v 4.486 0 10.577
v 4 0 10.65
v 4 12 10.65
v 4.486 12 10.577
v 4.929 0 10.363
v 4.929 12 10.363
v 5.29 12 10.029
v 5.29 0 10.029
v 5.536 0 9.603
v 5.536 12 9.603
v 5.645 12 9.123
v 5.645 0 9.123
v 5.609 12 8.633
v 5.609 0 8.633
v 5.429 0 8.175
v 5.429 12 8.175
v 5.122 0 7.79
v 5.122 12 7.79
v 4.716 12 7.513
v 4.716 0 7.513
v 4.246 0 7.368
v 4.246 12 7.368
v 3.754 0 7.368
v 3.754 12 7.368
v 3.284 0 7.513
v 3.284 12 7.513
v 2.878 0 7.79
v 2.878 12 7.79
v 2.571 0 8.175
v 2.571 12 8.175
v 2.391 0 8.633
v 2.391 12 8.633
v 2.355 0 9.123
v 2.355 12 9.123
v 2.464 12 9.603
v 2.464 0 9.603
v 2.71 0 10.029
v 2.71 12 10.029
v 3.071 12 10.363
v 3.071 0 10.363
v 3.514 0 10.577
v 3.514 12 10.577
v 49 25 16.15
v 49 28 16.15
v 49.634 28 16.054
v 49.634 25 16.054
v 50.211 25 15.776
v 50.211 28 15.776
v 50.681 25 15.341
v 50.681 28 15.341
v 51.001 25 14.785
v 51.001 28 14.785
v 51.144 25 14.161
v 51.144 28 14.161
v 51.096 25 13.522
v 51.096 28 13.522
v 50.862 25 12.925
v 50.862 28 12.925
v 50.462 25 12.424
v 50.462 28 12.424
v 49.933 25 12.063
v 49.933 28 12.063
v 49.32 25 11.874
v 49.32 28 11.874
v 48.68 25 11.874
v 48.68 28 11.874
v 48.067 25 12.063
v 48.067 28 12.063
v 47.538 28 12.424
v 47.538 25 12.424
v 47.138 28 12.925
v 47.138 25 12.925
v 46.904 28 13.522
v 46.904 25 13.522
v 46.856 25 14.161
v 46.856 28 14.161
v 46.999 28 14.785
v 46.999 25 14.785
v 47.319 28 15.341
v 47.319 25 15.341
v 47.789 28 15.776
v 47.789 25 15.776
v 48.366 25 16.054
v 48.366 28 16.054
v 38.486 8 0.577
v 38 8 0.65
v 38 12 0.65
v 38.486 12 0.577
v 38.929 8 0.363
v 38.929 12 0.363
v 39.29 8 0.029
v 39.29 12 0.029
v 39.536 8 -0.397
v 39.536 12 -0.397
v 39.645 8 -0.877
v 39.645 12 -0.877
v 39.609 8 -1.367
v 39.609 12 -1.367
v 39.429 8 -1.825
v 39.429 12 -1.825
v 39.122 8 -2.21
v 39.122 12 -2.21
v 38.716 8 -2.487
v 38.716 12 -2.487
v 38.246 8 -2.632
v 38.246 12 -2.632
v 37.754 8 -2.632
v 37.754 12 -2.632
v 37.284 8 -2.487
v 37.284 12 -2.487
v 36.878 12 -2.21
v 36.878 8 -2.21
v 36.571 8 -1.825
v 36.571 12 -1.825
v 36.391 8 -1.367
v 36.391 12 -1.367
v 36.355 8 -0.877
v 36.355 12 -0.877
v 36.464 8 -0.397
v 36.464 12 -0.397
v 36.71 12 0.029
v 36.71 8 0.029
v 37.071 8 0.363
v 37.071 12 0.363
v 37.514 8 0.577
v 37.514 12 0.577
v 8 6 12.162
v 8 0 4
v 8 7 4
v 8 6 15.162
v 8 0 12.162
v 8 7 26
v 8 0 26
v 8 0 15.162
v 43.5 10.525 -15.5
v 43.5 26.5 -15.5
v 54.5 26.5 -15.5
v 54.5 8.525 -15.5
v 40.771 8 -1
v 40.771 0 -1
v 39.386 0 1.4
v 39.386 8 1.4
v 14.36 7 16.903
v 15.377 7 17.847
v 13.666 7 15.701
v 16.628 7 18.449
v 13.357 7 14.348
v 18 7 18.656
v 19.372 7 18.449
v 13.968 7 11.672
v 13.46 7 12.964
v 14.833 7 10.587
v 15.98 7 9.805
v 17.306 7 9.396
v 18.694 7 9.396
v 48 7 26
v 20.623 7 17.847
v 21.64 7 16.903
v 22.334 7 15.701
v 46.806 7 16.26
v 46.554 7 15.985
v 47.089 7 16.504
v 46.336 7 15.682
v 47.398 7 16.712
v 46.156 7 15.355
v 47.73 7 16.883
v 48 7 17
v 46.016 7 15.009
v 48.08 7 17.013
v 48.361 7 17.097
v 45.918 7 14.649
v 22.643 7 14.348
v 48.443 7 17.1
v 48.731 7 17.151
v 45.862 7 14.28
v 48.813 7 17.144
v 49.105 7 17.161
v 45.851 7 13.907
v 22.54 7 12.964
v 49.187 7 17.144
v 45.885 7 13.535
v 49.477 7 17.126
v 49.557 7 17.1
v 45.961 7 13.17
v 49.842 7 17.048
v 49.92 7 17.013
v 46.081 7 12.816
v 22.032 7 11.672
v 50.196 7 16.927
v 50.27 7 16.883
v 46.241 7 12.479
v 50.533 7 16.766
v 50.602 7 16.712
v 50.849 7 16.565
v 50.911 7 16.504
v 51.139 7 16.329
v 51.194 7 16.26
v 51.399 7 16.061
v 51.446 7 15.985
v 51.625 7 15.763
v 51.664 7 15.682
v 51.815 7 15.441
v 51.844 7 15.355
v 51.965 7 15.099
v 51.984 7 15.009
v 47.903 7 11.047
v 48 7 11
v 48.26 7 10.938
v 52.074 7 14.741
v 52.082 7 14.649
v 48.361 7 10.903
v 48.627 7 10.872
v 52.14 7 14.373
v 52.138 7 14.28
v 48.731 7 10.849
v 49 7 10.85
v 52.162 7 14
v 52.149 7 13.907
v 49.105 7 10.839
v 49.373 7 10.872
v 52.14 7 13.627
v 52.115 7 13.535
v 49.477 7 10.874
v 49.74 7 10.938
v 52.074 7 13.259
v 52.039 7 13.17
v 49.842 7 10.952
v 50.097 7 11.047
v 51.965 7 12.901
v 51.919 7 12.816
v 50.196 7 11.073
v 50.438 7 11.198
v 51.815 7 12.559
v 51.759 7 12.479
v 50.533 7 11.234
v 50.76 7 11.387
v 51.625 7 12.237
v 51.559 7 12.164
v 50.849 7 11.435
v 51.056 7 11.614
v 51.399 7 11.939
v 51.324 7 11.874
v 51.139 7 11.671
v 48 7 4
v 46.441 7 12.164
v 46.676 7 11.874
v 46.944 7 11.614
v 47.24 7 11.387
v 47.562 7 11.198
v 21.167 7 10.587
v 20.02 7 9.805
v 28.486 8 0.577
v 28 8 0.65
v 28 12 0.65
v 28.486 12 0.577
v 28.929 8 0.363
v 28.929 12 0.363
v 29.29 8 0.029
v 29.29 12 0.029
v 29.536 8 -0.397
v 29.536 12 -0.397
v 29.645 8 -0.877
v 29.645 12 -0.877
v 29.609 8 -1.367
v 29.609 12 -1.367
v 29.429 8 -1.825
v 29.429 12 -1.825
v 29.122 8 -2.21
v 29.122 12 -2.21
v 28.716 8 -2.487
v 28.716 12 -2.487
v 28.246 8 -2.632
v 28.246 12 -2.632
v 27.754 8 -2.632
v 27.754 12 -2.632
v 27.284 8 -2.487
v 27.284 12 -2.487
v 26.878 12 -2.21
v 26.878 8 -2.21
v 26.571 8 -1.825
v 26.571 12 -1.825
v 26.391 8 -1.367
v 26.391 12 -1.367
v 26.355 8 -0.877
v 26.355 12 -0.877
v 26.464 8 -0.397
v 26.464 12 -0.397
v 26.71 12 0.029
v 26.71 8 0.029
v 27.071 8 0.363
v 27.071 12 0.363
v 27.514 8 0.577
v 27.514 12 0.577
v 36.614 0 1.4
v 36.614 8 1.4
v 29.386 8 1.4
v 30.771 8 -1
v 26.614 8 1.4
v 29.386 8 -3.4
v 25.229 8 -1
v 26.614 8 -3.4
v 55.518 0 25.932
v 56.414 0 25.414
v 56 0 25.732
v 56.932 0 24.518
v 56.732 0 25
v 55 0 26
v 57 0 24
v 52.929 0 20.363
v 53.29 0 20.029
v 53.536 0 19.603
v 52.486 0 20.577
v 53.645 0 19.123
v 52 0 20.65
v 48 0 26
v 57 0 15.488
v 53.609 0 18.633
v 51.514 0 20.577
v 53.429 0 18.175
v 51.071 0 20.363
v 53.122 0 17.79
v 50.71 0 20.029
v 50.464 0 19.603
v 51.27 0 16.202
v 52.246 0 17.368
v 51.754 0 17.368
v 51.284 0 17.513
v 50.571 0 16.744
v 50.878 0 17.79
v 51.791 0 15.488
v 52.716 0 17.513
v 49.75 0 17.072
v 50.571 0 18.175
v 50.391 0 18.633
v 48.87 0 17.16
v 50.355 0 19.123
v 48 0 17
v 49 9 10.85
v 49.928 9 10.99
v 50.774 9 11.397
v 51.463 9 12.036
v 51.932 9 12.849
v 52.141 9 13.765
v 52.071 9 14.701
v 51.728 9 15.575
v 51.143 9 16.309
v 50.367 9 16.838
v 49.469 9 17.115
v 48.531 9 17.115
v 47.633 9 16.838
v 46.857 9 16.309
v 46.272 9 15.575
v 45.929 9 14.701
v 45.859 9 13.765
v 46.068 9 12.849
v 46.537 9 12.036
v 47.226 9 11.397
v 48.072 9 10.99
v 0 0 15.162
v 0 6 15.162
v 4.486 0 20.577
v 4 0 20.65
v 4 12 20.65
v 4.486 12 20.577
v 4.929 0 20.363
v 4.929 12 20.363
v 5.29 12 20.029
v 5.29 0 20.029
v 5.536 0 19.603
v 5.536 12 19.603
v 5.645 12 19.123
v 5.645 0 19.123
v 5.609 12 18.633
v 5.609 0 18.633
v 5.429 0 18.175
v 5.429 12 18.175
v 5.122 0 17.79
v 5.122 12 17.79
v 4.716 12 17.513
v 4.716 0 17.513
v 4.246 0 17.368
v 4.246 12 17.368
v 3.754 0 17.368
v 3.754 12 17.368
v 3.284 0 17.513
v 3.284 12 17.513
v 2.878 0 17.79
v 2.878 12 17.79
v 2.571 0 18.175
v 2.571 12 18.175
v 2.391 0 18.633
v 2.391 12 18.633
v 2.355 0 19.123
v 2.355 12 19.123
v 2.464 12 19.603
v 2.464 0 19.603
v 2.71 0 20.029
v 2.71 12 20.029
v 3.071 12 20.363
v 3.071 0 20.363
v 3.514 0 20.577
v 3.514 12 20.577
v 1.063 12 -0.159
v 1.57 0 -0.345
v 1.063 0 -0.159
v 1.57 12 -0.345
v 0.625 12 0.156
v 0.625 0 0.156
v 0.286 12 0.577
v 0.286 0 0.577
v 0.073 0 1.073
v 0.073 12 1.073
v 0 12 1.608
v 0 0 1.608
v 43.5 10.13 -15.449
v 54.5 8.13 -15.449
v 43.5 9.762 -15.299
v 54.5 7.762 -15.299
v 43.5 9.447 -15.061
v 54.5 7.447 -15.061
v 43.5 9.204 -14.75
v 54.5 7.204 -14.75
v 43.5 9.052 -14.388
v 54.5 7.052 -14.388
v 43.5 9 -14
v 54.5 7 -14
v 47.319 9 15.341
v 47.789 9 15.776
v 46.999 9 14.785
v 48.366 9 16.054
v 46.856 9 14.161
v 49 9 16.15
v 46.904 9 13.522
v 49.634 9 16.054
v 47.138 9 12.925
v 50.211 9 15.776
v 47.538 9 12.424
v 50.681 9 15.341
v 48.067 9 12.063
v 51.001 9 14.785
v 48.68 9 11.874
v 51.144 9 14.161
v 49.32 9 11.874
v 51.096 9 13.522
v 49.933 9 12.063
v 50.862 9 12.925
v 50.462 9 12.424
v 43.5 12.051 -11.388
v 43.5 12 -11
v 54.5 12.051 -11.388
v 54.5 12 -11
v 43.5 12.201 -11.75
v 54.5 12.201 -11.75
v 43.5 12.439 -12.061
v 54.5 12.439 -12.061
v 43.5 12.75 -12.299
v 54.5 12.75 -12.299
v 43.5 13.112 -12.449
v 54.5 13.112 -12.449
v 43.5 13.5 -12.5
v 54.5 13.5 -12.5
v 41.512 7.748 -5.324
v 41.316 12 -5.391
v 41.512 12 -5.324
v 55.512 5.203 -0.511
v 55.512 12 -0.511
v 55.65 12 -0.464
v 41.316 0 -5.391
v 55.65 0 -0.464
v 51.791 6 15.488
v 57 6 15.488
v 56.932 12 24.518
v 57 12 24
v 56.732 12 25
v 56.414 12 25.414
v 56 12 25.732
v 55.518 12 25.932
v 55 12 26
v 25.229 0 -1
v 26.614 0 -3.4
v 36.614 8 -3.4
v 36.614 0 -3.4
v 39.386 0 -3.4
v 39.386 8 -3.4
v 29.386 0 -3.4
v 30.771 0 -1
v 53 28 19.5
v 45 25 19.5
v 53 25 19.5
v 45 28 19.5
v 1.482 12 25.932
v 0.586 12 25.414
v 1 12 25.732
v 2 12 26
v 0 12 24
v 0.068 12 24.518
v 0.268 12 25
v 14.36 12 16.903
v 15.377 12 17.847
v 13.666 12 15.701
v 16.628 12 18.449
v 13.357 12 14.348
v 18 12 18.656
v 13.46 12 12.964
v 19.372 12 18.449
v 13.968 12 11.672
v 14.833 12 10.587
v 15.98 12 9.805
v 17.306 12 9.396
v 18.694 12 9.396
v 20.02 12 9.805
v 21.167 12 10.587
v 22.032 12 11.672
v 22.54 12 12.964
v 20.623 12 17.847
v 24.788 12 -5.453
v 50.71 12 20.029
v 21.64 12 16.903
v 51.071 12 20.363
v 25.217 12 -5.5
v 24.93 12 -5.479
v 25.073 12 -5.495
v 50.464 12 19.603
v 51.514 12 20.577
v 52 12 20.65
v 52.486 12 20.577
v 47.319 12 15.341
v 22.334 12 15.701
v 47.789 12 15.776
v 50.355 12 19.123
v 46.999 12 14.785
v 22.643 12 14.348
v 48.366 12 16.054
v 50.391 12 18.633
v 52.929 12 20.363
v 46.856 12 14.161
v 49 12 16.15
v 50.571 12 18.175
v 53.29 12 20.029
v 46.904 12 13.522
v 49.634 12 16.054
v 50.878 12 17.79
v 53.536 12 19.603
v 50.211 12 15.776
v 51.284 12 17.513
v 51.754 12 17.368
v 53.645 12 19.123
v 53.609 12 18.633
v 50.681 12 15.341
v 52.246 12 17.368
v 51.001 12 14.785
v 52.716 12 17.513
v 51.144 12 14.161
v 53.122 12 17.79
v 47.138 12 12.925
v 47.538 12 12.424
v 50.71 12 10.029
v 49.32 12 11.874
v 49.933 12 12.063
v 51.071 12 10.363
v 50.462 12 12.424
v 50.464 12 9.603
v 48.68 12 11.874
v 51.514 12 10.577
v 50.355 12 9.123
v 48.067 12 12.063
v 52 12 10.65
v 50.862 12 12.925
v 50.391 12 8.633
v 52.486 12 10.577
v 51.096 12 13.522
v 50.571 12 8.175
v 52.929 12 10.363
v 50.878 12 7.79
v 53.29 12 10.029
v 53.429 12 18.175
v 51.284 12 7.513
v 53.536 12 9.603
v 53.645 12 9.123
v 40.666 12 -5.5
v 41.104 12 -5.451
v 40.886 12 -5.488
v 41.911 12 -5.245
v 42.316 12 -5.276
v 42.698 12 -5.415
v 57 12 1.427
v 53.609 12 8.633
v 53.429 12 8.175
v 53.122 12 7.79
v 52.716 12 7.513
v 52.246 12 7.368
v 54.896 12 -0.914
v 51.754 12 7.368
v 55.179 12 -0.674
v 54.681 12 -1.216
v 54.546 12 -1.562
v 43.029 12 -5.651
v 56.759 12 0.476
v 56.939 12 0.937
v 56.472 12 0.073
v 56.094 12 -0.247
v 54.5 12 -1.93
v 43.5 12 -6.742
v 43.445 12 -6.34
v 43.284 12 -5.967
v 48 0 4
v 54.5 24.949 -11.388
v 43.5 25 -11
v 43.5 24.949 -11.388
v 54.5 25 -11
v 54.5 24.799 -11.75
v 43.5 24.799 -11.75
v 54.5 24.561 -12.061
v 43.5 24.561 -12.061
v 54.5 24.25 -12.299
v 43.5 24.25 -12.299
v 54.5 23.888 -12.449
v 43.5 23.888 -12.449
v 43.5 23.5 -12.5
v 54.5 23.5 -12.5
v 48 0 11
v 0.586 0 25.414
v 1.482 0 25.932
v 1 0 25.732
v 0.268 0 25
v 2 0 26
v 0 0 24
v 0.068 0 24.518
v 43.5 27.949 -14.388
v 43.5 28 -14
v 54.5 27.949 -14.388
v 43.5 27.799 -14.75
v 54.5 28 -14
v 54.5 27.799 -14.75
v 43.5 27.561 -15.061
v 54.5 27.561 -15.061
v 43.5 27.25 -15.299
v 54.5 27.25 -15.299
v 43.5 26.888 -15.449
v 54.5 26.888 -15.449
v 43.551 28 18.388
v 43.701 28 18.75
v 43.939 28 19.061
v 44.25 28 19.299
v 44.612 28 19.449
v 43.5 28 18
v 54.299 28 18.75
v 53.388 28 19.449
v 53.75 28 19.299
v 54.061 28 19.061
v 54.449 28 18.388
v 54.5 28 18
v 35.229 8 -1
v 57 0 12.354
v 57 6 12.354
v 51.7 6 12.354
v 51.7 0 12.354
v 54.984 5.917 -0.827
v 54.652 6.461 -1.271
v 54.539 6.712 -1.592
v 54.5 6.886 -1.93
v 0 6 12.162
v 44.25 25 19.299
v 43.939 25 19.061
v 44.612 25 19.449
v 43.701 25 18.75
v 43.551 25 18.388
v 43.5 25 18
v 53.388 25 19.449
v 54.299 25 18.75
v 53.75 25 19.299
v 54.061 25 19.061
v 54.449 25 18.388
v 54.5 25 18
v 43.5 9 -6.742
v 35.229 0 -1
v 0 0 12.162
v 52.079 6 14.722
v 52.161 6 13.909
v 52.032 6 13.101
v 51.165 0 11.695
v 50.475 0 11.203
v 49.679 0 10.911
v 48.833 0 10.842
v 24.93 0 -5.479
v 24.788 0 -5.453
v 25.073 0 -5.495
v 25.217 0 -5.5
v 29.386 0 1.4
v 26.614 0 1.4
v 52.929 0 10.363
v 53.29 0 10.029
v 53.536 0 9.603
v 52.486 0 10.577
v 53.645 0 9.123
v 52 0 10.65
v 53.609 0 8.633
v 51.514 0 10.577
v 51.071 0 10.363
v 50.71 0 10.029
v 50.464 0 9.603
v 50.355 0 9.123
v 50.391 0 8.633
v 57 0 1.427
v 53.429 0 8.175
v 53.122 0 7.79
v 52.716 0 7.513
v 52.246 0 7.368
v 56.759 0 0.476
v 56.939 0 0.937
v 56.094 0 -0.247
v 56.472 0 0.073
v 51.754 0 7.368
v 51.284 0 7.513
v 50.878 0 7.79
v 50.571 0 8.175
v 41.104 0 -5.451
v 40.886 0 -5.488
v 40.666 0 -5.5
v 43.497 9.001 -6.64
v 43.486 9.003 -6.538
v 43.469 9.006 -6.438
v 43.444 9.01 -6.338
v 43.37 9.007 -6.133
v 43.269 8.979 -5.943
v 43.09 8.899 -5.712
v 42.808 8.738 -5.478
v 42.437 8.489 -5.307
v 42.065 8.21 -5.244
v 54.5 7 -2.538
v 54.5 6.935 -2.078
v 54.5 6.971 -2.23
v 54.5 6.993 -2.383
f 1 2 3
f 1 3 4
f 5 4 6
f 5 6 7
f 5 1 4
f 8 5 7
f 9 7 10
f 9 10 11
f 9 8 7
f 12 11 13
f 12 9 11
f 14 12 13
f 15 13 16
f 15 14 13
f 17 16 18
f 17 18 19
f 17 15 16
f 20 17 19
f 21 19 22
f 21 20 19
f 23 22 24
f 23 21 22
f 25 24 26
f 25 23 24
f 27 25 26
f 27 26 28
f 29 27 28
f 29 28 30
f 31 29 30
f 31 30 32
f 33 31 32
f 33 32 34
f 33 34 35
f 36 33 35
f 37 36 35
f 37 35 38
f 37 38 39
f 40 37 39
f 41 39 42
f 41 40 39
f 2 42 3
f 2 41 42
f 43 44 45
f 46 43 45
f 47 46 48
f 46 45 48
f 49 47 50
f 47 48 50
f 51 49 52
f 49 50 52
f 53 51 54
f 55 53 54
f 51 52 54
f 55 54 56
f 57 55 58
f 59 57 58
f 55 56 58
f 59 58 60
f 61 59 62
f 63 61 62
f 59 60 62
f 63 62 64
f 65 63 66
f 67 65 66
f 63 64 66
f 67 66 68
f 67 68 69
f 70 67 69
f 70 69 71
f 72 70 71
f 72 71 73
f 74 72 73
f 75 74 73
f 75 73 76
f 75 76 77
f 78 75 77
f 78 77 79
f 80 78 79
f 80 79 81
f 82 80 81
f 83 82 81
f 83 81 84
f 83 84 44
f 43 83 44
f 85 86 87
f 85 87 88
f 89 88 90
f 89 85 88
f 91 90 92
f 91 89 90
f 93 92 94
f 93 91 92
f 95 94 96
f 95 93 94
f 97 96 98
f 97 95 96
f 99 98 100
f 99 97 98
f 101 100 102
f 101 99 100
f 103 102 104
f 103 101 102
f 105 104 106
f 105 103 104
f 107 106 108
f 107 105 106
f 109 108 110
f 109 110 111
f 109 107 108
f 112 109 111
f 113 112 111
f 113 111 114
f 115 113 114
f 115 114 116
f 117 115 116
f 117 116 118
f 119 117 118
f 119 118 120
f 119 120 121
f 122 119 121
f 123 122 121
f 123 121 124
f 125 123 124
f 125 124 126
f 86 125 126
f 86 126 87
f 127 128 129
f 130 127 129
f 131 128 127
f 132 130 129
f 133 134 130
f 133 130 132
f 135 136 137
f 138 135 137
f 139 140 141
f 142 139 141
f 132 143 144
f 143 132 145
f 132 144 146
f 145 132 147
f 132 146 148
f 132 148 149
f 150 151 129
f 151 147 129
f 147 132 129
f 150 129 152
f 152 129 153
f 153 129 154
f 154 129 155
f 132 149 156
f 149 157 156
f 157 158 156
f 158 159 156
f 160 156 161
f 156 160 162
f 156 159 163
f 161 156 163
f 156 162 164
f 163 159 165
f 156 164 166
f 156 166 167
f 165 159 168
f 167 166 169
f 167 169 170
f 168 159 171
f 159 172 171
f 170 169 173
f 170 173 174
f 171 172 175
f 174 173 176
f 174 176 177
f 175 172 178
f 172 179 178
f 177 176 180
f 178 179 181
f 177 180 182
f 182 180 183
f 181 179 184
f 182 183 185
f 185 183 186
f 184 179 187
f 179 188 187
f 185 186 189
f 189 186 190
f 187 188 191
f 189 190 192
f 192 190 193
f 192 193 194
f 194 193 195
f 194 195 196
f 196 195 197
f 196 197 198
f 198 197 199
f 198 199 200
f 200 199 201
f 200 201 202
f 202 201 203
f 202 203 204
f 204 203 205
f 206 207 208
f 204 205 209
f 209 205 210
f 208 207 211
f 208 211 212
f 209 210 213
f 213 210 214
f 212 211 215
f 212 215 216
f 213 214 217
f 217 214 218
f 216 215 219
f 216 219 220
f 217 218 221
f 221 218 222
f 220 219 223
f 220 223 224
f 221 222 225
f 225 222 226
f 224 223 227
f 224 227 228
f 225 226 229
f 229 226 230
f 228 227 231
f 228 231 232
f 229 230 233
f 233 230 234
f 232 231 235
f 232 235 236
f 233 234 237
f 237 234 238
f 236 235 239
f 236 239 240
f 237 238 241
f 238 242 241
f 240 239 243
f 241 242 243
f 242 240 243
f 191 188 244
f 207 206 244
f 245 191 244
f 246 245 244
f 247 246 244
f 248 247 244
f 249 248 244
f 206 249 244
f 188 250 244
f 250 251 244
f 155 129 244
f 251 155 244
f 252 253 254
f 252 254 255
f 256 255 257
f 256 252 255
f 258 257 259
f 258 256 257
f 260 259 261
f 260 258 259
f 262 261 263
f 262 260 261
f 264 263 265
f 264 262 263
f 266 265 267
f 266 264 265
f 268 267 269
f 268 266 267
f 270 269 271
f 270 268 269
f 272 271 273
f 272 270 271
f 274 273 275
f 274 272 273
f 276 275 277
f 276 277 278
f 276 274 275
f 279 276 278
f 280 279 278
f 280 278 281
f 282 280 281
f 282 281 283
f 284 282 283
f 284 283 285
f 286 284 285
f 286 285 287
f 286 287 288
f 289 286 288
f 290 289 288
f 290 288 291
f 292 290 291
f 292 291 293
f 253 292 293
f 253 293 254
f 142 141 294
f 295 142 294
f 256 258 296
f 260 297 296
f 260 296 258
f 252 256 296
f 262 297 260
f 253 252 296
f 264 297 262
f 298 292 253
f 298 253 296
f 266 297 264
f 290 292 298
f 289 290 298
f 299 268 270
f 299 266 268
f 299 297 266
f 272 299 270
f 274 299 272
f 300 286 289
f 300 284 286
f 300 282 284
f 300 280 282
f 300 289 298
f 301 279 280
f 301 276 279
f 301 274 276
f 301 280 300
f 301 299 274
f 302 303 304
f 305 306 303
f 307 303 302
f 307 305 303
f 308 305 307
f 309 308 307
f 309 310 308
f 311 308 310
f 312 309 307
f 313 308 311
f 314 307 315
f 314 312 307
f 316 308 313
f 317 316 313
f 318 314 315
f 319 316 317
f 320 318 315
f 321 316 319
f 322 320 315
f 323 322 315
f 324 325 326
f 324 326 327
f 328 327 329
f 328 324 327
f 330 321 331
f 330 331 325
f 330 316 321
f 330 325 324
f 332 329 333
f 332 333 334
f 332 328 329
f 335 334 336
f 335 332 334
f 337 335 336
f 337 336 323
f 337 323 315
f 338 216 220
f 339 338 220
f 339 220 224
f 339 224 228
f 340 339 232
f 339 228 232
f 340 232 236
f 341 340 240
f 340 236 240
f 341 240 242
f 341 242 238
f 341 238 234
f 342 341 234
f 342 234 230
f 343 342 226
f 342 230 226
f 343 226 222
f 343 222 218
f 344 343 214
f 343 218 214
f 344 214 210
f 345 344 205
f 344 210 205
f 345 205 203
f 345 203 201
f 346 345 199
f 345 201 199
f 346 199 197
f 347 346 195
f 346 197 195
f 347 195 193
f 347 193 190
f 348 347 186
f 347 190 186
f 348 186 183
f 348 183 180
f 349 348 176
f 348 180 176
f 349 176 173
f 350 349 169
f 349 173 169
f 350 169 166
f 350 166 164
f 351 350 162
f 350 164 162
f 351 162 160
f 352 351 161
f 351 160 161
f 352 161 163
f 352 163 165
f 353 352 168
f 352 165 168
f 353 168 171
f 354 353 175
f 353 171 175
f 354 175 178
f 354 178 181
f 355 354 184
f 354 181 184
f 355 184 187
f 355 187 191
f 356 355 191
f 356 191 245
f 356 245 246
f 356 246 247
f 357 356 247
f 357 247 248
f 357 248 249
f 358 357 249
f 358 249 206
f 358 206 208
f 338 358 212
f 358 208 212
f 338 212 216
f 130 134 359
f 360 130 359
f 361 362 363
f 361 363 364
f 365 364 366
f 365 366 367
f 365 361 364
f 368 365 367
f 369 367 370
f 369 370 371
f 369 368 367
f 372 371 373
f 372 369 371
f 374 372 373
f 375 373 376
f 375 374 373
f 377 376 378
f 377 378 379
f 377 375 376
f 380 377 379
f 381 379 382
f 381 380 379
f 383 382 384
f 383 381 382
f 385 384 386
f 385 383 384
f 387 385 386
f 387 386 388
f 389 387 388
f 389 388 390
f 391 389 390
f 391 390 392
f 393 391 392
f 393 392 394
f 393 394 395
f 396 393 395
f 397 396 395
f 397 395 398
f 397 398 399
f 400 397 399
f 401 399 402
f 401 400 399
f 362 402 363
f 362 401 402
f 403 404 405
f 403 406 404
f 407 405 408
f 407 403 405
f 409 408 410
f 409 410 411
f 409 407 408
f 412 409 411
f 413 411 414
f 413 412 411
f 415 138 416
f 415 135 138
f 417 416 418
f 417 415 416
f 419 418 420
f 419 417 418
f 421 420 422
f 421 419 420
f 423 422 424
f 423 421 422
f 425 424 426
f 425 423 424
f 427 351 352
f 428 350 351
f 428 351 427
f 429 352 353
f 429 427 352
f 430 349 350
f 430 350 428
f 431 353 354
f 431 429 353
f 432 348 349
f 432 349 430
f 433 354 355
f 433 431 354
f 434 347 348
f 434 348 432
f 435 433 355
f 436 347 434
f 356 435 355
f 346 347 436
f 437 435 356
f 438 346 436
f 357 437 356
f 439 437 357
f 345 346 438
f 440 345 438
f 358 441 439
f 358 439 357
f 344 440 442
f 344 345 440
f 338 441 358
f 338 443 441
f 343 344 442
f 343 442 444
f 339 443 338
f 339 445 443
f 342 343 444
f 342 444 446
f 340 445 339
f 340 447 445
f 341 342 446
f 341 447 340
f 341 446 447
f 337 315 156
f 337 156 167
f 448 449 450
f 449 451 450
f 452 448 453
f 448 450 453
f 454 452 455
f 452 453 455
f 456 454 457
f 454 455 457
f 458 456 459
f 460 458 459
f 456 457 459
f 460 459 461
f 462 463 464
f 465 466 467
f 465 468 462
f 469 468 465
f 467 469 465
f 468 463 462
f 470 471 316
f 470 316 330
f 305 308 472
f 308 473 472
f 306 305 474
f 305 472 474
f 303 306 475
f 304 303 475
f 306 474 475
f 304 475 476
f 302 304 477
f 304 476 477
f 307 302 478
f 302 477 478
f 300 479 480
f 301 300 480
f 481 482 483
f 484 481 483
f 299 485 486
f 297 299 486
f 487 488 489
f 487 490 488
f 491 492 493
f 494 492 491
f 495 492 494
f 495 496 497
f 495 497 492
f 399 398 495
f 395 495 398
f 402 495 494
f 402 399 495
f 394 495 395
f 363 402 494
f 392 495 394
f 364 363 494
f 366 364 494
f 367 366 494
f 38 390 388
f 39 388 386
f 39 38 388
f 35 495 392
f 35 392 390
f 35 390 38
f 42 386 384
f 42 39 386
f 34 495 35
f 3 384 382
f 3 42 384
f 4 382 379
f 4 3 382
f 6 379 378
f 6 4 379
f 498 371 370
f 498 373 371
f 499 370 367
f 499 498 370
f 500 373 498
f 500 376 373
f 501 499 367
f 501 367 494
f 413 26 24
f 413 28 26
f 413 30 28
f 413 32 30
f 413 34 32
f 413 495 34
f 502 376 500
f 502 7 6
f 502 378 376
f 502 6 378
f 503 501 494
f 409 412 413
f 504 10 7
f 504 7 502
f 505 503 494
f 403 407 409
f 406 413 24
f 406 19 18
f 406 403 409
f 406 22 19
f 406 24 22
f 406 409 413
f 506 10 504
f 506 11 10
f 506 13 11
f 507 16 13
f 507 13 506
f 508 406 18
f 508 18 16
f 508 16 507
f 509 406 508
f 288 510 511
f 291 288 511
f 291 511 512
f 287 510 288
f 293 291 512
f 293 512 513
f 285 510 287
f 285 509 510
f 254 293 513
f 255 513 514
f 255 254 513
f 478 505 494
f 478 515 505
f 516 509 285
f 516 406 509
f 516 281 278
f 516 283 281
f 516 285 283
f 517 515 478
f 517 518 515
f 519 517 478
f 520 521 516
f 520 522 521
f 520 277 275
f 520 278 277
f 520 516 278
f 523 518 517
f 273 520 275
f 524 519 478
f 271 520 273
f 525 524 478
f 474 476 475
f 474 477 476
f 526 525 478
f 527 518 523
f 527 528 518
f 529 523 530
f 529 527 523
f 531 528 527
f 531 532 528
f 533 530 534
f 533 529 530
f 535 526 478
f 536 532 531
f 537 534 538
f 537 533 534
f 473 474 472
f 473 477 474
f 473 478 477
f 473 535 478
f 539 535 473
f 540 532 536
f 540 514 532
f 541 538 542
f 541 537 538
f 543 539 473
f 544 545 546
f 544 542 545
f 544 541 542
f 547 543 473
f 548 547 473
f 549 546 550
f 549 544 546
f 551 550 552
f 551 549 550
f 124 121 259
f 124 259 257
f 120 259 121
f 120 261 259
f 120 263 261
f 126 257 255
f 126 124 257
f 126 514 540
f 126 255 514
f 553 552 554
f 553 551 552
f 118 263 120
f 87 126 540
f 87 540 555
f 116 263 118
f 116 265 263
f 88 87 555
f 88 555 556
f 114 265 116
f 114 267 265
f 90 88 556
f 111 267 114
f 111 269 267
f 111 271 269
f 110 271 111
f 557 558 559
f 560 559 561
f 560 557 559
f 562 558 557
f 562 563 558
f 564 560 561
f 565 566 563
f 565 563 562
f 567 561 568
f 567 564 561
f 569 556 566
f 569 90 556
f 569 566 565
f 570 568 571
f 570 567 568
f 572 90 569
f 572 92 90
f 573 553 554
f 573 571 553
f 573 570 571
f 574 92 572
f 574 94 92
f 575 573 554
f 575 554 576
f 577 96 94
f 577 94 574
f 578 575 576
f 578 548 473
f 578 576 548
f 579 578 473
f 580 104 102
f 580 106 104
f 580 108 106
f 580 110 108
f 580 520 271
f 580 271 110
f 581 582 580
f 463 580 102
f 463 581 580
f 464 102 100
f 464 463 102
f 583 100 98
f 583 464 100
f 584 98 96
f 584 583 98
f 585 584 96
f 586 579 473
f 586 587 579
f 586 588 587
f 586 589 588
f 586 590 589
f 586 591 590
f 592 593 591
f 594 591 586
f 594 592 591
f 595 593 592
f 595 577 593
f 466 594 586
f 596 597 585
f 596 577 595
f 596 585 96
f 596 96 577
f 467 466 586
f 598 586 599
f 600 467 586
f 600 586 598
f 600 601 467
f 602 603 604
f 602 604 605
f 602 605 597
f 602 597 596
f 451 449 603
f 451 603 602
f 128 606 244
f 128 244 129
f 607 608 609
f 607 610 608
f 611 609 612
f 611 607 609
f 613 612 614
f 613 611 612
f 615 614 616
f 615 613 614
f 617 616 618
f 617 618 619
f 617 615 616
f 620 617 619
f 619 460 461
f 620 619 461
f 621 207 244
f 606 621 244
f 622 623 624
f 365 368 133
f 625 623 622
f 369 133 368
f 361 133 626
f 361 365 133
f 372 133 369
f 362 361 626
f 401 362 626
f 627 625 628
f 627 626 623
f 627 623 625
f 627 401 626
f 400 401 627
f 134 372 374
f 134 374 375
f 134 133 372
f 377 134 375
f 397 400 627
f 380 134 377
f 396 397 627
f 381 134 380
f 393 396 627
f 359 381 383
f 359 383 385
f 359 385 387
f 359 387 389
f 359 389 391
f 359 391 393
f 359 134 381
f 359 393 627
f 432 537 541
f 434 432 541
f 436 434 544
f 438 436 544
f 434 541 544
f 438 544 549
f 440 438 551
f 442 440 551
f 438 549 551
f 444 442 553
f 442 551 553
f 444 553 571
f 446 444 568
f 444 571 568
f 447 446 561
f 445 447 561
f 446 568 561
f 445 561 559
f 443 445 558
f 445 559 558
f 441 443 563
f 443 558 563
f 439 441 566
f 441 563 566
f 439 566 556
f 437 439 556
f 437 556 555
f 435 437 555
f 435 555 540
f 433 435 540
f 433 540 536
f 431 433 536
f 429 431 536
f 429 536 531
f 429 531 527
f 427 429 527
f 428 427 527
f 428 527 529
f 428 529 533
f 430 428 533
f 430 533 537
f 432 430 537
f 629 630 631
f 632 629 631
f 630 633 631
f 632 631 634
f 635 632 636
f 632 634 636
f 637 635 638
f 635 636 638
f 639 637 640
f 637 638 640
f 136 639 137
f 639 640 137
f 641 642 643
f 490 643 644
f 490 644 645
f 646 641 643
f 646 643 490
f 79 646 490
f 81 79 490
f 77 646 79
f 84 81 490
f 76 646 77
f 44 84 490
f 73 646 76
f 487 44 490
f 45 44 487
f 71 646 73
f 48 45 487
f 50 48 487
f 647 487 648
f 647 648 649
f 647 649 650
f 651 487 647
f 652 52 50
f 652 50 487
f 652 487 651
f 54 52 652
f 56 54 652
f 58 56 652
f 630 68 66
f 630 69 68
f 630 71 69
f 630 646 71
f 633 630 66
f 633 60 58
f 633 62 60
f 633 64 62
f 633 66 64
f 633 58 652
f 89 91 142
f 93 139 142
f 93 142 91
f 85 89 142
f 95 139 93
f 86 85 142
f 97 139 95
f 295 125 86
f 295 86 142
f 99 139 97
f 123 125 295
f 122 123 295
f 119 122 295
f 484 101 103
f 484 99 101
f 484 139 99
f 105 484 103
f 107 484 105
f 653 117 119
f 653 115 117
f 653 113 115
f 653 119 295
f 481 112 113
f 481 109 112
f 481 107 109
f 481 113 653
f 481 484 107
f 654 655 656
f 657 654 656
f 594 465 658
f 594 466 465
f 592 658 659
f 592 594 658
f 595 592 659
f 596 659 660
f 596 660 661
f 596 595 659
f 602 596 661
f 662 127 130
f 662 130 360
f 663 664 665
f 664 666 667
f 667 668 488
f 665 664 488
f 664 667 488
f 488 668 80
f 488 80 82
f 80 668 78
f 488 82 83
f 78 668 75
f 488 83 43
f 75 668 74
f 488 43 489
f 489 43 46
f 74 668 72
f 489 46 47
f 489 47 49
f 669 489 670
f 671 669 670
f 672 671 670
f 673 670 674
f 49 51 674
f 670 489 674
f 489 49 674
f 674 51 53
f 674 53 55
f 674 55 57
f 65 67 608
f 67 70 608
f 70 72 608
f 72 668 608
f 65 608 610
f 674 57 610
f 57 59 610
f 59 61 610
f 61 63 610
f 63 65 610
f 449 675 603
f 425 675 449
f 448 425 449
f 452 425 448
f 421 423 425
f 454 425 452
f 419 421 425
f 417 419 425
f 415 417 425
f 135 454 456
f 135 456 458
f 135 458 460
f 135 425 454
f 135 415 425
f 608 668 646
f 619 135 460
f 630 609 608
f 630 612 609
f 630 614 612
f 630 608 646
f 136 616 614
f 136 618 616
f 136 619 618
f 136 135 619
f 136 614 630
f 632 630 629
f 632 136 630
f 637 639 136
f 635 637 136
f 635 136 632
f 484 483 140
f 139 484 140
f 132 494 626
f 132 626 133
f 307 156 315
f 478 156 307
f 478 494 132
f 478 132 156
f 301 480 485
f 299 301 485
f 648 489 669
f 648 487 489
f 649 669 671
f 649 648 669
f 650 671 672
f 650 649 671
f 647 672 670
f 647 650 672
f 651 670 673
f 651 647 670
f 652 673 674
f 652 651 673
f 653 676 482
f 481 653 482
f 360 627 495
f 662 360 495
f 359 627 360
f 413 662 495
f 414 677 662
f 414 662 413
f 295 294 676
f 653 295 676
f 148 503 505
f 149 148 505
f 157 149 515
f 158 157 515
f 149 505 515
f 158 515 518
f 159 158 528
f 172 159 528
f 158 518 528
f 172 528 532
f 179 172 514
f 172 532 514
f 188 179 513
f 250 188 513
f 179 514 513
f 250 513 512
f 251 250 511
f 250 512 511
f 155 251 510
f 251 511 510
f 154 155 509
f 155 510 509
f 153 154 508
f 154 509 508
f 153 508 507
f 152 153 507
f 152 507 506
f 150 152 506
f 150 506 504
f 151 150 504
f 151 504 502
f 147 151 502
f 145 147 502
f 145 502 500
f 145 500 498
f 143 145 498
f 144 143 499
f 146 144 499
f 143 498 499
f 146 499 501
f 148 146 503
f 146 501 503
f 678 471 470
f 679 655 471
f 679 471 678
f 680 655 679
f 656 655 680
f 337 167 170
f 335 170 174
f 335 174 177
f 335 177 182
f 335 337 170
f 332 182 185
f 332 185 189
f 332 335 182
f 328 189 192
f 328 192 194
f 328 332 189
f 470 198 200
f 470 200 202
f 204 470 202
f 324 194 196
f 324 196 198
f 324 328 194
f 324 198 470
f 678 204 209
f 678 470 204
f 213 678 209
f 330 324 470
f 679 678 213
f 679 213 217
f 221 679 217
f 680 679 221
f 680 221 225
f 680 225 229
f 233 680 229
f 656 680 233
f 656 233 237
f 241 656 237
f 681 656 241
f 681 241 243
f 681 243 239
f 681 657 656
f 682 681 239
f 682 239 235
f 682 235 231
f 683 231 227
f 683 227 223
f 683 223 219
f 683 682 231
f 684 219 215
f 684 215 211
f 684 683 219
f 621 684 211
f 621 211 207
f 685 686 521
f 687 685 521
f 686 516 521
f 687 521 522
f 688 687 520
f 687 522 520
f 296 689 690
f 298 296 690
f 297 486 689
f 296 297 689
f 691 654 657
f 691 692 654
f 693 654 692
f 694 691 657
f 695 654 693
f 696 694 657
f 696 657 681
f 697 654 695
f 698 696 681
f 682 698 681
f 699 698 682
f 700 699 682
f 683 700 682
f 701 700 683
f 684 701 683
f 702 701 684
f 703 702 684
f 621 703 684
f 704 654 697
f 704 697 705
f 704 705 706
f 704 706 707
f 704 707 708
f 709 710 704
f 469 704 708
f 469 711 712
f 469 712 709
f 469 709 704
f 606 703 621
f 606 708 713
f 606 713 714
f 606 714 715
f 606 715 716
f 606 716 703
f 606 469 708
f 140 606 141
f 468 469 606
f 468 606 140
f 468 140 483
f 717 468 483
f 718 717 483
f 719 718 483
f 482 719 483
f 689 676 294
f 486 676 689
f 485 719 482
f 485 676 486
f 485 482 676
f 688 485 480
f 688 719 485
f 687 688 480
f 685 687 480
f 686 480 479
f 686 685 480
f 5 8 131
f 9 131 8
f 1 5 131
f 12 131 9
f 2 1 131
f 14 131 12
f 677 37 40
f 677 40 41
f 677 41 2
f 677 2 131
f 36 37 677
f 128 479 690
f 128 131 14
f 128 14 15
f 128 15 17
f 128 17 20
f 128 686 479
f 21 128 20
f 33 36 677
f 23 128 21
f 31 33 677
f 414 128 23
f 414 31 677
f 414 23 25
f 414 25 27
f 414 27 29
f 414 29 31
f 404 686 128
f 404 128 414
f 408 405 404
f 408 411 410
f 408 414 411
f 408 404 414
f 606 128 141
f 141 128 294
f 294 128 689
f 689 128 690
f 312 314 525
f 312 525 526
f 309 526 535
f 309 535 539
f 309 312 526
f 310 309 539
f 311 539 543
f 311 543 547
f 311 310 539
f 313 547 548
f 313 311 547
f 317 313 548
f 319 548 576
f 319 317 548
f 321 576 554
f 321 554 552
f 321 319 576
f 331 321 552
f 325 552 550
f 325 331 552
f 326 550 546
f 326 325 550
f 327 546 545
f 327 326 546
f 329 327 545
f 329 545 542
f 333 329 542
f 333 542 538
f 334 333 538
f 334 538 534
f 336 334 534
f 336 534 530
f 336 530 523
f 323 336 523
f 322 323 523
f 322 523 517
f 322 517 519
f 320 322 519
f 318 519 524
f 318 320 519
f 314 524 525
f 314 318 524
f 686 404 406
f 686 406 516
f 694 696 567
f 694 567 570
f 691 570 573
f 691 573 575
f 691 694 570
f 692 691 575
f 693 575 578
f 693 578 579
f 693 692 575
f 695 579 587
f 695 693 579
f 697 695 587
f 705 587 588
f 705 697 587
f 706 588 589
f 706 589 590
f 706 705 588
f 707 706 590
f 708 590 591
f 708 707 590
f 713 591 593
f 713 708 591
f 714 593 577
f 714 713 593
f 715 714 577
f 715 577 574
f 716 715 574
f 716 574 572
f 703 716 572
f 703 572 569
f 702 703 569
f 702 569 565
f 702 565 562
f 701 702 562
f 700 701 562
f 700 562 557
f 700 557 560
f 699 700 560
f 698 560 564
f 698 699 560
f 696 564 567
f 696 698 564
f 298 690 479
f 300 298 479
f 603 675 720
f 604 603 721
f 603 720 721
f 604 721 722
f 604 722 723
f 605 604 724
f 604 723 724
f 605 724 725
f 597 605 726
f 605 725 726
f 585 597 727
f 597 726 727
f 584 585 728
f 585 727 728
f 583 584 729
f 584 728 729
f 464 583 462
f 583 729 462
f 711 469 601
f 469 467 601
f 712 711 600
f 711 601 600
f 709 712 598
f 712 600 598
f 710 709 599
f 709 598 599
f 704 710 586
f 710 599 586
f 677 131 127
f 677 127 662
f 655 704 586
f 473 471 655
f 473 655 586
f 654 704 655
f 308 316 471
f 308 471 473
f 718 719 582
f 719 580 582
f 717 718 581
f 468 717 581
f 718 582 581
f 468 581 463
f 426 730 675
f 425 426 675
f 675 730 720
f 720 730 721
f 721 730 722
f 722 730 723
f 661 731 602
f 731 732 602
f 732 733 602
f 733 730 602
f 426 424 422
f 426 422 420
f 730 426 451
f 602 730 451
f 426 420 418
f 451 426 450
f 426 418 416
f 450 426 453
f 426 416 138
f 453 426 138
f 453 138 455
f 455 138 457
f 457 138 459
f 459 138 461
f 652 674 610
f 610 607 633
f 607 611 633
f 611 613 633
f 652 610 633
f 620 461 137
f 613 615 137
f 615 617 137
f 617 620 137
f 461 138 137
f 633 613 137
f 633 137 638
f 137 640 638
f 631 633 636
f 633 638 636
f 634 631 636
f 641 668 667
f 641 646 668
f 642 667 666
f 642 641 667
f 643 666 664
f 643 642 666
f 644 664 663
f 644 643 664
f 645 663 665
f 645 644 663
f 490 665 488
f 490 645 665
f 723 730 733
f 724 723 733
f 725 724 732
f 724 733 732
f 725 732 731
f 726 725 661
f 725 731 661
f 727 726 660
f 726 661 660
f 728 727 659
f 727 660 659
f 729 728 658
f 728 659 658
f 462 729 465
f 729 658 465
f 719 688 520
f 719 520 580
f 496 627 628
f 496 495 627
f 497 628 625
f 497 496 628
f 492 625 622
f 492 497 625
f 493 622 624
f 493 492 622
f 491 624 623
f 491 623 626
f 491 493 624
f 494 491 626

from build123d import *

# Parameters (mm, degrees)
SKETCH_1_R           = 1.6500000000000006
SKETCH_1_R_2         = 1.6500000000000001
SKETCH_1_R_3         = 1.6500000000000028
SKETCH_1_R_4         = 1.6500000000000017
SKETCH_1_R_5         = 1.6499999999999986
SKETCH_1_R_6         = 1.6499999999999955
EXTRUDE_1_DEPTH      = 12
CUT_EXTRUDE_1_DEPTH  = 8
FILLET_1_R           = 2
SKETCH_5_R           = 1.5499999999999978
EXTRUDE_3_DEPTH      = 5
SKETCH_5_R_2         = 1.5500000000000012
EXTRUDE_3_2_DEPTH    = 5
SKETCH_5_R_3         = 4.656253475136203
EXTRUDE_3_3_DEPTH    = 5
SKETCH_7_R           = 3.149999999999999
CUT_EXTRUDE_2_DEPTH  = 2
SKETCH_8_W           = 8
SKETCH_8_H           = 3
SKETCH_8_W_2         = 5.29999999999999
SKETCH_8_H_2         = 3.1337502138362687
CUT_EXTRUDE_3_DEPTH  = 6
SKETCH_6_R           = 1.5499999999999974
SKETCH_6_R_2         = 1.5500000000000012
CUT_EXTRUDE_4_DEPTH  = 10
EXTRUDE_9_DEPTH      = 10
EXTRUDE_9_DEPTH_BACK = 10
SKETCH_18_W          = 11.000000000000007
SKETCH_18_H          = 3
EXTRUDE_10_DEPTH     = 16
SKETCH_19_W          = 11.000000000000007
SKETCH_19_H          = 3
EXTRUDE_11_DEPTH     = 32
SKETCH_20_R          = 2.1500000000000012
CUT_EXTRUDE_7_DEPTH  = 22
FILLET_4_R           = 1.5


with BuildPart() as part:
    # 草图1 → 凸台-拉伸1 (new body)
    with BuildSketch(Plane(origin=(0, 0, 0), x_dir=(1, 0, 0), z_dir=(0, 1, 0))):
        with BuildLine():
            Line((0, 0), (25, 5.5))
            Line((25, 5.5), (41, 5.5))
            Line((41, 5.5), (57, 0))
            Line((57, 0), (57, -26.000000000000004))
            Line((57, -26.000000000000004), (48, -26.000000000000004))
            Line((48, -26.000000000000004), (48, -17.000000000000004))
            ThreePointArc((48, -17.000000000000004), (52.16227766016838, -14.000000000000004), (48, -11.000000000000004))
            Line((48, -11.000000000000004), (48, -4.0000000000000036))
            Line((48, -4.0000000000000036), (8.000000000000004, -4.0000000000000036))
            Line((8.000000000000004, -4.0000000000000036), (8.000000000000004, -26.000000000000004))
            Line((8.000000000000004, -26.000000000000004), (0, -26.000000000000004))
            Line((0, -26.000000000000004), (0, 0))
        make_face()
        with Locations(Location((4.000000000000001, -9.000000000000002, 0), (0, 0, 270))):
            Circle(SKETCH_1_R, mode=Mode.SUBTRACT)
        with Locations(Location((4.000000000000001, -19.000000000000004, 0), (0, 0, 270))):
            Circle(SKETCH_1_R_2, mode=Mode.SUBTRACT)
        with Locations(Location((52.00000000000001, -9.000000000000002, 0), (0, 0, 270))):
            Circle(SKETCH_1_R_3, mode=Mode.SUBTRACT)
        with Locations(Location((52.00000000000001, -19.000000000000004, 0), (0, 0, 270))):
            Circle(SKETCH_1_R_4, mode=Mode.SUBTRACT)
        with Locations(Location((28, 0.9999999999999966, 0), (0, 0, 270))):
            Circle(SKETCH_1_R_5, mode=Mode.SUBTRACT)
        with Locations(Location((38, 0.9999999999999966, 0), (0, 0, 270))):
            Circle(SKETCH_1_R_6, mode=Mode.SUBTRACT)
    extrude(amount=EXTRUDE_1_DEPTH)

    # 草图2 → 切除-拉伸1 (cut)
    with BuildSketch(Plane(origin=(0, 0, 0), x_dir=(-1, 0, 0), z_dir=(0, -1, 0))):
        Polygon((-26.614359353944906, -1.400000000000001), (-25.2287187078898, 1.0000000000000004), (-26.614359353944902, 3.399999999999998), (-29.3856406460551, 3.399999999999998), (-30.771281292110206, 1), (-29.3856406460551, -1.4000000000000015), align=None)
        Polygon((-36.6143593539449, -1.400000000000001), (-35.2287187078898, 1.0000000000000004), (-36.6143593539449, 3.399999999999998), (-39.385640646055094, 3.399999999999998), (-40.7712812921102, 1), (-39.385640646055094, -1.4000000000000015), align=None)
    extrude(amount=-CUT_EXTRUDE_1_DEPTH, mode=Mode.SUBTRACT)

    # 圆角1
    fillet_1_edges = [part.edges().sort_by_distance(p)[0] for p in [
        (0, 6, 0),
        (25, 6, -5.5),
        (41, 6, -5.5),
        (57, 6, 0),
        (57, 6, 26.000000000000004),
        (0, 6, 26.000000000000004),
    ]]
    fillet(fillet_1_edges, radius=FILLET_1_R)

    # 草图8 → 切除-拉伸3 (cut)
    with BuildSketch(Plane(origin=(0, 0, 0), x_dir=(-1, 0, 0), z_dir=(0, -1, 0))):
        with Locations((-4.0000000000000036, -13.662025546184847)):
            Rectangle(SKETCH_8_W, SKETCH_8_H)
        with Locations((-54.35000000000001, -13.920667343602716)):
            Rectangle(SKETCH_8_W_2, SKETCH_8_H_2)
    extrude(amount=-CUT_EXTRUDE_3_DEPTH, mode=Mode.SUBTRACT)



with BuildPart() as body_2:
    # 草图5 → 凸台-拉伸3 (new body)
    with BuildSketch(Plane(origin=(0, 12, 0), x_dir=(1, 0, 0), z_dir=(0, 1, 0))):
        with Locations(Location((28, 0.9999999999999966, 0), (0, 0, 270))):
            Circle(SKETCH_5_R)
    extrude(amount=-EXTRUDE_3_DEPTH)


with BuildPart() as body_3:
    # 草图5 → Extrude 3 2 (new body)
    with BuildSketch(Plane(origin=(0, 12, 0), x_dir=(1, 0, 0), z_dir=(0, 1, 0))):
        with Locations(Location((38, 0.9999999999999966, 0), (0, 0, 270))):
            Circle(SKETCH_5_R_2)
    extrude(amount=-EXTRUDE_3_2_DEPTH)


with BuildPart() as body_4:
    # 草图5 → Extrude 3 3 (new body)
    with BuildSketch(Plane(origin=(0, 12, 0), x_dir=(1, 0, 0), z_dir=(0, 1, 0))):
        with BuildLine():
            Line((48, -11.000000000000004), (48, -4.0000000000000036))
            Line((48, -4.0000000000000036), (8.000000000000004, -4.0000000000000036))
            Line((8.000000000000004, -4.0000000000000036), (8.000000000000004, -26.000000000000004))
            Line((8.000000000000004, -26.000000000000004), (48, -26.000000000000004))
            Line((48, -26.000000000000004), (48, -17.000000000000004))
            ThreePointArc((48, -17.000000000000004), (52.16227766016838, -14.000000000000004), (48, -11.000000000000004))
        make_face()
        with Locations(Location((49, -14.000000000000004, 0), (0, 0, 270))):
            Circle(SKETCH_5_R_2, mode=Mode.SUBTRACT)
        with Locations(Location((18, -14.000000000000002, 0), (0, 0, 270))):
            Circle(SKETCH_5_R_3, mode=Mode.SUBTRACT)
    extrude(amount=-EXTRUDE_3_3_DEPTH)

    # 草图7 → 切除-拉伸2 (cut)
    with BuildSketch(Plane(origin=(0, 7, 0), x_dir=(-1, 0, 0), z_dir=(0, -1, 0))):
        with Locations(Location((-49, -14.000000000000004, 0), (0, 0, 90))):
            Circle(SKETCH_7_R)
    extrude(amount=-CUT_EXTRUDE_2_DEPTH, mode=Mode.SUBTRACT)


with BuildPart() as cut_extrude_4_tool:
    # 草图6 → 切除-拉伸4 (new body)
    with BuildSketch(Plane(origin=(0, 7, 0), x_dir=(-1, 0, 0), z_dir=(0, -1, 0))):
        with Locations((-28, 0.9999999999999966)):
            Circle(SKETCH_6_R)
        with Locations((-38, 0.9999999999999966)):
            Circle(SKETCH_6_R_2)
    extrude(amount=-CUT_EXTRUDE_4_DEPTH)


with BuildPart() as body_2_1:
    add(body_2.part)

    # 切除-拉伸4: cut by cut_extrude_4_tool
    add(cut_extrude_4_tool.part, mode=Mode.SUBTRACT)


with BuildPart() as body_3_1:
    add(body_3.part)

    # 切除-拉伸4: cut by cut_extrude_4_tool
    add(cut_extrude_4_tool.part, mode=Mode.SUBTRACT)


with BuildPart() as part_1:
    add(part.part)

    add(body_4.part)  # 凸台-拉伸9 merges body 4
    # 草图17 → 凸台-拉伸9 (add, two sides: drawn at the far end of the back side and taken through both)
    with BuildSketch(Plane(origin=(0, 0, -5.5), x_dir=(-1, 0, 0), z_dir=(0, 0, -1)).offset(-EXTRUDE_9_DEPTH_BACK)):
        Polygon((-43.5, 12), (-54.5, 11.999999999999998), (-54.5, 6.999999999999999), (-43.5, 9.000000000000002), align=None)
    extrude(amount=EXTRUDE_9_DEPTH + EXTRUDE_9_DEPTH_BACK)

    # 草图18 → 凸台-拉伸10 (add)
    with BuildSketch(Plane(origin=(0, 12, 0), x_dir=(1, 0, 0), z_dir=(0, 1, 0))):
        with Locations((49, 14.000000000000002)):
            Rectangle(SKETCH_18_W, SKETCH_18_H)
    extrude(amount=EXTRUDE_10_DEPTH)

    # 草图19 → 凸台-拉伸11 (add)
    with BuildSketch(Plane.XY.offset(-12.5)):
        with Locations((49, 26.500000000000004)):
            Rectangle(SKETCH_19_W, SKETCH_19_H)
    extrude(amount=EXTRUDE_11_DEPTH)

    # 草图20 → 切除-拉伸7 (cut)
    with BuildSketch(Plane(origin=(0, 28, 0), x_dir=(1, 0, 0), z_dir=(0, 1, 0))):
        with Locations(Location((49, -14.000000000000004, 0), (0, 0, 270))):
            Circle(SKETCH_20_R)
    extrude(amount=-CUT_EXTRUDE_7_DEPTH, mode=Mode.SUBTRACT)

    # 圆角4
    fillet_4_edges = [part_1.edges().sort_by_distance(p)[0] for p in [
        (49, 12, -12.5),
        (49, 28, -15.5),
        (49, 25, -12.5),
        (43.5, 26.5, 19.5),
        (54.5, 26.5, 19.5),
        (49, 8, -15.5),
        (54.5, 9.499999999999998, -0.8593749999999969),
        (49, 8, -2.749999999999998),
        (43.5, 10.5, -4.640624999999999),
    ]]
    fillet(fillet_4_edges, radius=FILLET_4_R)


solid = part_1.part
